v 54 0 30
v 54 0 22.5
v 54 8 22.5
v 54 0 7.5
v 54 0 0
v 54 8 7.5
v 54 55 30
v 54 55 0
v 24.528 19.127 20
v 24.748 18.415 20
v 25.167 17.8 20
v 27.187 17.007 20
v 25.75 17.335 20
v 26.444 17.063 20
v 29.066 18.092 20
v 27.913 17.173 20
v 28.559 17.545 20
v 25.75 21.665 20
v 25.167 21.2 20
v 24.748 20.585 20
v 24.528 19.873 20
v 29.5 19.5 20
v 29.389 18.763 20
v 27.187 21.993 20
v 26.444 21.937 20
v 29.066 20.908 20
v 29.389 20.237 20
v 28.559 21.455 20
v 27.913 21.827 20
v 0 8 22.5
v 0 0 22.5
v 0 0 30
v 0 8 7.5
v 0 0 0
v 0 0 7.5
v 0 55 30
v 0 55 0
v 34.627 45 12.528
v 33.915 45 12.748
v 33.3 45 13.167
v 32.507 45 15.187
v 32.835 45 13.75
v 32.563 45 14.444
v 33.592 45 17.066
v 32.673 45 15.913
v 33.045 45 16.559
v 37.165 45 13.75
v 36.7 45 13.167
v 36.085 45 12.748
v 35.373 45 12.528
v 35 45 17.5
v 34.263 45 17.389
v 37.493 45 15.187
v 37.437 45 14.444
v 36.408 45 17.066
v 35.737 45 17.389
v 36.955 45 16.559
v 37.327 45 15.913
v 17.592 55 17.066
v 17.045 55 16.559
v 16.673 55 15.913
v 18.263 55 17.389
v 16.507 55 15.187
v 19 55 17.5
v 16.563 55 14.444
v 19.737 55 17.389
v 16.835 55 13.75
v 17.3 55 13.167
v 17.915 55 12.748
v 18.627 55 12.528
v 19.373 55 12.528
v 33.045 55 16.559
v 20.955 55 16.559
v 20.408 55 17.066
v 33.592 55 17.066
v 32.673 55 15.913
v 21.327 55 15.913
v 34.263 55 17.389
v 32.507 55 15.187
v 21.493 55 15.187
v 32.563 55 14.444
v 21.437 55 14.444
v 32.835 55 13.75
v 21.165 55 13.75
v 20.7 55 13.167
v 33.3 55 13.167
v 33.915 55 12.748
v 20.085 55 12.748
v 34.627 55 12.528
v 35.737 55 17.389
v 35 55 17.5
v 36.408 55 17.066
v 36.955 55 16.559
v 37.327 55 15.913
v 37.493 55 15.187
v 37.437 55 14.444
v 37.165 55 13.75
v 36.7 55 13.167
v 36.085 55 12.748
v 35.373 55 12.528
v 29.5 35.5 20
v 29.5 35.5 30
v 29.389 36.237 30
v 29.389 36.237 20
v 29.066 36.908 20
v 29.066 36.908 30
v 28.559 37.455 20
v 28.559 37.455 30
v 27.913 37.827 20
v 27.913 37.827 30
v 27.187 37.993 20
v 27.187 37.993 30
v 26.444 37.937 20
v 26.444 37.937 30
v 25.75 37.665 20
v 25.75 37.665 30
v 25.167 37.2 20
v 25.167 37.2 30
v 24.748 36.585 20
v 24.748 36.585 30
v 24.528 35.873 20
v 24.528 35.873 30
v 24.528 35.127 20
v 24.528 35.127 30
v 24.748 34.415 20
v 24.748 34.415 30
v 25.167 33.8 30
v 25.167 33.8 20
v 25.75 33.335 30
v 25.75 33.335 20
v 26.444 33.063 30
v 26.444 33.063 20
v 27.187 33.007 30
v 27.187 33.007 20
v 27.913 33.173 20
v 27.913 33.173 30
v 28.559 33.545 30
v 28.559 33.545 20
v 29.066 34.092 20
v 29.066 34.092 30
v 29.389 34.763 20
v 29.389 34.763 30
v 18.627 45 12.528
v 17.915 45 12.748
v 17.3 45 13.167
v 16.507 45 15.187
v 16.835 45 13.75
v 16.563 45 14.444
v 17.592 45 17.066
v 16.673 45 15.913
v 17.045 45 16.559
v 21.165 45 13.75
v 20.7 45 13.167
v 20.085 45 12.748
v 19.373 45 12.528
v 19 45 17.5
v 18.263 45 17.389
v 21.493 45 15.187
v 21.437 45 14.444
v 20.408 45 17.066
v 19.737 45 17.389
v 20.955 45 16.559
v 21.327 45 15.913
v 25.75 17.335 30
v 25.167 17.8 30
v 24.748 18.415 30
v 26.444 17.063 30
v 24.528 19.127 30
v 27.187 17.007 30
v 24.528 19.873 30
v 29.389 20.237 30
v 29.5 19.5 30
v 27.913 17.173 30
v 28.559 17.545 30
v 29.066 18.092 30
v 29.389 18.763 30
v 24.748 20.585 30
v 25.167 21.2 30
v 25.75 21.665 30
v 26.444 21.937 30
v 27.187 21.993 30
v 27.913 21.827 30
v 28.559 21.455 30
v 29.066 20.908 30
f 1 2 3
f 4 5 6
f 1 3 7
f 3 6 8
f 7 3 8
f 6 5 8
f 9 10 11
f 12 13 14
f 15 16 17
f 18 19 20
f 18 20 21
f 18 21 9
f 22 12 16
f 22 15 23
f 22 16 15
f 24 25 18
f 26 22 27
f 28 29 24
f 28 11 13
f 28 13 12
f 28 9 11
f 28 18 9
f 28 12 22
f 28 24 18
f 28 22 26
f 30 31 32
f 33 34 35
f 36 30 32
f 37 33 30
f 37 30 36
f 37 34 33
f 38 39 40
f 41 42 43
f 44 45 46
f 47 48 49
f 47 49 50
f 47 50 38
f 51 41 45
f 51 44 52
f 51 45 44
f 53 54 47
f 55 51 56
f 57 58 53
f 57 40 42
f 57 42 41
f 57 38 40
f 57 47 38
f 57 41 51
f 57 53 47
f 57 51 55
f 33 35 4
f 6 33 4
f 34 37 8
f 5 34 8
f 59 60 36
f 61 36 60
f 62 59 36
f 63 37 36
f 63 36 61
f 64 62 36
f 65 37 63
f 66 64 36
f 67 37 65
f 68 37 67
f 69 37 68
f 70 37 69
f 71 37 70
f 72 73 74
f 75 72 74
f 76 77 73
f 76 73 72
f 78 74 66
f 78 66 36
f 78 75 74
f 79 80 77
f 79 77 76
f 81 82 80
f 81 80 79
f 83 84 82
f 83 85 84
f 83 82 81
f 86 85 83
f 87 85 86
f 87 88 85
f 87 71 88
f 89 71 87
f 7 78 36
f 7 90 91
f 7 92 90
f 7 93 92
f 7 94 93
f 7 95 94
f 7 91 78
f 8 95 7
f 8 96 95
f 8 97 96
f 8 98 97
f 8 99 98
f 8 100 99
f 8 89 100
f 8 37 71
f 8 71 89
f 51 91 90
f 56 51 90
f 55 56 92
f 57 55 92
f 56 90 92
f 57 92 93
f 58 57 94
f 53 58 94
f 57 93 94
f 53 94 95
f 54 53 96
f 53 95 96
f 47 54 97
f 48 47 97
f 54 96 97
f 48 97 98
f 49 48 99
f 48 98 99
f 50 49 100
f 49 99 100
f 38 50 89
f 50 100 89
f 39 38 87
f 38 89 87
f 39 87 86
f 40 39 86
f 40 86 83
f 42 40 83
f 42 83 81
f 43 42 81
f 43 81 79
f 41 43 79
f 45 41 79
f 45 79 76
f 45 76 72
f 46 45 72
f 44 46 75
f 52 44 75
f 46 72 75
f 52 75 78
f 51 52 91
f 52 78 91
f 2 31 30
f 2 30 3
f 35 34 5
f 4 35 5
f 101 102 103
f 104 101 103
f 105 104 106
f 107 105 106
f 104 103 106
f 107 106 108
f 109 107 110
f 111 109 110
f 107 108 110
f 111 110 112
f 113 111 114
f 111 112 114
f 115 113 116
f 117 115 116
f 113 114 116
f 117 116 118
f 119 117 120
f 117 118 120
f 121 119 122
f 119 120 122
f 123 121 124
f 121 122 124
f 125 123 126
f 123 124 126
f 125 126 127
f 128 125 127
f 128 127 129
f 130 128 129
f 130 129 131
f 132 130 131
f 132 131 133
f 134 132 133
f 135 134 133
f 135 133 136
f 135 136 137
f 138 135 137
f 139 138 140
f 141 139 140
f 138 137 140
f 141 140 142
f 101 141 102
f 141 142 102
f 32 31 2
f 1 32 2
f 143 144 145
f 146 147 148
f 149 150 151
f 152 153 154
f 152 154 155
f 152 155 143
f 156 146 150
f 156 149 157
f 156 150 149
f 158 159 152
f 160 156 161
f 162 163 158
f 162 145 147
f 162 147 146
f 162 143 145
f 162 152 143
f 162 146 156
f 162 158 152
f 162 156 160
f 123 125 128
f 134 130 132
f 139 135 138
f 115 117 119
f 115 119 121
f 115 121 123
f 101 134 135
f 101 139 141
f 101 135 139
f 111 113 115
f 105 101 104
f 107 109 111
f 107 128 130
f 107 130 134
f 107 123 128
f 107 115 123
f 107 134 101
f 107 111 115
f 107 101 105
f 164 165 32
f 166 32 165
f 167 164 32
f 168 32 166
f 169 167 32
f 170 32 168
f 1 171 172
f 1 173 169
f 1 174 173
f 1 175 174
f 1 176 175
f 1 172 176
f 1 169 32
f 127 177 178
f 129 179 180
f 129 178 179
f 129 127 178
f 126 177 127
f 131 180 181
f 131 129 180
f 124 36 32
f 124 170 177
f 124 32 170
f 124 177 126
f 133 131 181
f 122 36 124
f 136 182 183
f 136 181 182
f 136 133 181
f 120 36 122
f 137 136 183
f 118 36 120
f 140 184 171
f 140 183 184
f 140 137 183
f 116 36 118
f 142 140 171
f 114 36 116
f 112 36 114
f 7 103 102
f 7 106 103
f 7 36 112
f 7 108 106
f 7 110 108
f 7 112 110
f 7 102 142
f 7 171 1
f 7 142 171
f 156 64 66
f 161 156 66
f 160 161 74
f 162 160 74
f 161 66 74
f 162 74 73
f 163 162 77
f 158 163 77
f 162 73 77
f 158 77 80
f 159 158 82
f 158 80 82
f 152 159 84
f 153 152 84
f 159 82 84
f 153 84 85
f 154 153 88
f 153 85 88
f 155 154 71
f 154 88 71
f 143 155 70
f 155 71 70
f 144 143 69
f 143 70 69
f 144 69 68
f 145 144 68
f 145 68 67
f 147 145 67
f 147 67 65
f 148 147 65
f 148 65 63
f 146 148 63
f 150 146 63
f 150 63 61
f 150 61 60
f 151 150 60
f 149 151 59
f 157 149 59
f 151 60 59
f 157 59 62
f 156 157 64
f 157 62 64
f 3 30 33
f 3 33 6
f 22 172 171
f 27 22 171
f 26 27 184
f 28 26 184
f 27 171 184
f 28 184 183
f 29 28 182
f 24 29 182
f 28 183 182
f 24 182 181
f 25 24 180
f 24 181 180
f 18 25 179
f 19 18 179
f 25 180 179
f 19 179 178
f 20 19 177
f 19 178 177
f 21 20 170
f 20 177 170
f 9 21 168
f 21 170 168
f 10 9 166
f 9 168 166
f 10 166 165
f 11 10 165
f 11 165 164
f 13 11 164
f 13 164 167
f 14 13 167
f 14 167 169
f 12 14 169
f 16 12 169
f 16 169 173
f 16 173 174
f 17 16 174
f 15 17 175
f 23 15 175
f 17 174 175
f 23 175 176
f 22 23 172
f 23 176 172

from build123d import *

# Parameters (mm, degrees)
SKETCH1_W           = 54
SKETCH1_H           = 55
BOSS_EXTRUDE1_DEPTH = 30
SKETCH2_W           = 54
SKETCH2_H           = 15
CUT_EXTRUDE1_DEPTH  = 8
SKETCH3_R           = 2.5
CUT_EXTRUDE2_DEPTH  = 10
SKETCH4_R           = 2.5
CUT_EXTRUDE3_DEPTH  = 10


with BuildPart() as part:
    # Sketch1 → Boss-Extrude1 (new body)
    with BuildSketch(Plane.XY):
        with Locations((27, 27.5)):
            Rectangle(SKETCH1_W, SKETCH1_H)
    extrude(amount=BOSS_EXTRUDE1_DEPTH)

    # Sketch2 → Cut-Extrude1 (cut)
    with BuildSketch(Plane.XZ):
        with Locations((27, 15)):
            Rectangle(SKETCH2_W, SKETCH2_H)
    extrude(amount=-CUT_EXTRUDE1_DEPTH, mode=Mode.SUBTRACT)

    # Sketch3 → Cut-Extrude2 (cut)
    with BuildSketch(Plane(origin=(0, 55, 0), x_dir=(1, 0, 0), z_dir=(0, 1, 0))):
        with Locations(Location((19, -15, 0), (0, 0, 270))):
            Circle(SKETCH3_R)
        with Locations(Location((35, -15, 0), (0, 0, 270))):
            Circle(SKETCH3_R)
    extrude(amount=-CUT_EXTRUDE2_DEPTH, mode=Mode.SUBTRACT)

    # Sketch4 → Cut-Extrude3 (cut)
    with BuildSketch(Plane.XY.offset(30)):
        with Locations((27, 35.5)):
            Circle(SKETCH4_R)
        with Locations((27, 19.5)):
            Circle(SKETCH4_R)
    extrude(amount=-CUT_EXTRUDE3_DEPTH, mode=Mode.SUBTRACT)


solid = part.part
